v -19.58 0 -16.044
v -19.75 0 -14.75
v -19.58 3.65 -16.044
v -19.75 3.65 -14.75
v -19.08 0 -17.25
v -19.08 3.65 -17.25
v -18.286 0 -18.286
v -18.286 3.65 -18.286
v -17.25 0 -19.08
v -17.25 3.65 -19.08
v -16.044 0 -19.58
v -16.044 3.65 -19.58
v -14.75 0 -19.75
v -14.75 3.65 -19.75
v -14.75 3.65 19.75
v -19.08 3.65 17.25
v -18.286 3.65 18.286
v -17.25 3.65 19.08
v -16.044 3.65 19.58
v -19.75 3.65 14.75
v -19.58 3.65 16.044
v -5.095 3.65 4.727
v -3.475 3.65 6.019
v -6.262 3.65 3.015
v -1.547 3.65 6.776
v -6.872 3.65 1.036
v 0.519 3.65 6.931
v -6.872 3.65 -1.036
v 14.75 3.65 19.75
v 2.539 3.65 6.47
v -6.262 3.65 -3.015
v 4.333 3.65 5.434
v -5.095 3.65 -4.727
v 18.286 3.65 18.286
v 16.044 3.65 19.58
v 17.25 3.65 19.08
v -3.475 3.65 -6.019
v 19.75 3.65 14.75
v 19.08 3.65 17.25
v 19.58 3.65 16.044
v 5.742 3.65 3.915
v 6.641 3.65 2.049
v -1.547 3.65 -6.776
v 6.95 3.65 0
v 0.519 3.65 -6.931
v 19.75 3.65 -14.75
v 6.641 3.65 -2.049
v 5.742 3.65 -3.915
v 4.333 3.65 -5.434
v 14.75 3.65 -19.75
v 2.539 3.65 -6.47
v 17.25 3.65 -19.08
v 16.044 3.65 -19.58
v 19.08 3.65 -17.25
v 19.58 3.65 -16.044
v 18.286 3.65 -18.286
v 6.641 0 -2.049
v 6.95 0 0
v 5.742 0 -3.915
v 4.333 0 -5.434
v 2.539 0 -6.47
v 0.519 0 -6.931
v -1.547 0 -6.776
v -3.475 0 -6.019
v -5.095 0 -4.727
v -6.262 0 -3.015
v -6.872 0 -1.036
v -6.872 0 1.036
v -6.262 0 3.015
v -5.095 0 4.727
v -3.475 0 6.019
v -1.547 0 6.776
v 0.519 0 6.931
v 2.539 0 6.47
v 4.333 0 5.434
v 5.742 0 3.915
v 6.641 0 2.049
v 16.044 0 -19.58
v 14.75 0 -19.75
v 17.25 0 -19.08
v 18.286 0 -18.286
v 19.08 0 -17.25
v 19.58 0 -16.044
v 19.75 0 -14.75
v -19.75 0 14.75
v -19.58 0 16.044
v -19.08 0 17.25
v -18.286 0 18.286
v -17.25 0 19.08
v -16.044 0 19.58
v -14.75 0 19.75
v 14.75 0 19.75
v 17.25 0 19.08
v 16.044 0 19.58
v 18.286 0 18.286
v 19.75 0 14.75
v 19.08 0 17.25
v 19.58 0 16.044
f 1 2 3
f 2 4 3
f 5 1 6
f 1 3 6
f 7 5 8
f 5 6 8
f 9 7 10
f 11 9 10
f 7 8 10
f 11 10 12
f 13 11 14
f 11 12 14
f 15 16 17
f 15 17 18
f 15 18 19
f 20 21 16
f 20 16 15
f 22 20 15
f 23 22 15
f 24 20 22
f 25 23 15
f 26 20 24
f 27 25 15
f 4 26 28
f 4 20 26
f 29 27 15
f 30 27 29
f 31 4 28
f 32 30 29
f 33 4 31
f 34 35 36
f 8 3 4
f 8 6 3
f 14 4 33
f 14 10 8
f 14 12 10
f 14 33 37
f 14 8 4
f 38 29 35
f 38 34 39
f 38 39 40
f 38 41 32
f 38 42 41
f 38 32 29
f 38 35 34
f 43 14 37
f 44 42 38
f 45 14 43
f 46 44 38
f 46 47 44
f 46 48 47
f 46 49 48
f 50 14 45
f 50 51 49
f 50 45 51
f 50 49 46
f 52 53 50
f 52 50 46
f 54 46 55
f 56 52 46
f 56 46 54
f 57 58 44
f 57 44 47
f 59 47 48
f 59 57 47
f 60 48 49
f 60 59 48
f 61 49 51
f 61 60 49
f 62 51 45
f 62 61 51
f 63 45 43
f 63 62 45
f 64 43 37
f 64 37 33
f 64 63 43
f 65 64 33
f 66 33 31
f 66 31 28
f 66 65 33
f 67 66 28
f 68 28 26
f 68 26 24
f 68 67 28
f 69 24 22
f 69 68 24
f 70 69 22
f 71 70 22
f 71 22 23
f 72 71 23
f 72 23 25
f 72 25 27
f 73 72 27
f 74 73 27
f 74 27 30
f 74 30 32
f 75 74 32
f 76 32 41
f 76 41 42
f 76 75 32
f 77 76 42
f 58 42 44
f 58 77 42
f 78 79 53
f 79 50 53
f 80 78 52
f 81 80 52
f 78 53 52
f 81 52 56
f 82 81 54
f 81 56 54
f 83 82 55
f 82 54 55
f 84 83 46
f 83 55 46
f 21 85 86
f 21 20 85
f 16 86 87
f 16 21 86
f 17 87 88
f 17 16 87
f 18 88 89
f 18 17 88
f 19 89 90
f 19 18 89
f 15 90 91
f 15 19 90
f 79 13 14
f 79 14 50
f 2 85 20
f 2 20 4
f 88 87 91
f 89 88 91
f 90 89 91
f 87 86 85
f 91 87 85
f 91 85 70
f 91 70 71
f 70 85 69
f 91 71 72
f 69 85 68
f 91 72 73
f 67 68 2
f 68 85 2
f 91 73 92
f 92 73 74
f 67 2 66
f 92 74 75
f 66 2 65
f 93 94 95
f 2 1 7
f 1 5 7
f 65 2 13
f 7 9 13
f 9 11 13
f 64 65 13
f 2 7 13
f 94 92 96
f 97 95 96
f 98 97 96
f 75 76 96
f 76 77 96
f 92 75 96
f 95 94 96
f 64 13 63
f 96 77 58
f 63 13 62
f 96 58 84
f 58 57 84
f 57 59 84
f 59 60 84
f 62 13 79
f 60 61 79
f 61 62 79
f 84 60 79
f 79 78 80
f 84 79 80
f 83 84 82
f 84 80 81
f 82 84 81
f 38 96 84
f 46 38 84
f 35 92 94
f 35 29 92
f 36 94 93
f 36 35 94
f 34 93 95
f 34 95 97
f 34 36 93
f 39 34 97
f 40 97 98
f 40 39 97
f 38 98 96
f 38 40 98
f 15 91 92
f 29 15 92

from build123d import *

# Parameters (mm, degrees)
SKETCH1_W           = 39.5
SKETCH1_H           = 39.5
SKETCH1_R           = 6.95
BOSS_EXTRUDE1_DEPTH = 3.65
FILLET1_R           = 5


with BuildPart() as part:
    # Sketch1 → Boss-Extrude1 (new body)
    with BuildSketch(Plane(origin=(0, 0, 0), x_dir=(1, 0, 0), z_dir=(0, 1, 0))):
        Rectangle(SKETCH1_W, SKETCH1_H)
        Circle(SKETCH1_R, mode=Mode.SUBTRACT)
    extrude(amount=BOSS_EXTRUDE1_DEPTH)

    # Fillet1
    fillet1_edges = [part.edges().sort_by_distance(p)[0] for p in [
        (-19.75, 1.825, -19.75),
        (19.75, 1.825, -19.75),
        (19.75, 1.825, 19.75),
        (-19.75, 1.825, 19.75),
    ]]
    fillet(fillet1_edges, radius=FILLET1_R)


solid = part.part
